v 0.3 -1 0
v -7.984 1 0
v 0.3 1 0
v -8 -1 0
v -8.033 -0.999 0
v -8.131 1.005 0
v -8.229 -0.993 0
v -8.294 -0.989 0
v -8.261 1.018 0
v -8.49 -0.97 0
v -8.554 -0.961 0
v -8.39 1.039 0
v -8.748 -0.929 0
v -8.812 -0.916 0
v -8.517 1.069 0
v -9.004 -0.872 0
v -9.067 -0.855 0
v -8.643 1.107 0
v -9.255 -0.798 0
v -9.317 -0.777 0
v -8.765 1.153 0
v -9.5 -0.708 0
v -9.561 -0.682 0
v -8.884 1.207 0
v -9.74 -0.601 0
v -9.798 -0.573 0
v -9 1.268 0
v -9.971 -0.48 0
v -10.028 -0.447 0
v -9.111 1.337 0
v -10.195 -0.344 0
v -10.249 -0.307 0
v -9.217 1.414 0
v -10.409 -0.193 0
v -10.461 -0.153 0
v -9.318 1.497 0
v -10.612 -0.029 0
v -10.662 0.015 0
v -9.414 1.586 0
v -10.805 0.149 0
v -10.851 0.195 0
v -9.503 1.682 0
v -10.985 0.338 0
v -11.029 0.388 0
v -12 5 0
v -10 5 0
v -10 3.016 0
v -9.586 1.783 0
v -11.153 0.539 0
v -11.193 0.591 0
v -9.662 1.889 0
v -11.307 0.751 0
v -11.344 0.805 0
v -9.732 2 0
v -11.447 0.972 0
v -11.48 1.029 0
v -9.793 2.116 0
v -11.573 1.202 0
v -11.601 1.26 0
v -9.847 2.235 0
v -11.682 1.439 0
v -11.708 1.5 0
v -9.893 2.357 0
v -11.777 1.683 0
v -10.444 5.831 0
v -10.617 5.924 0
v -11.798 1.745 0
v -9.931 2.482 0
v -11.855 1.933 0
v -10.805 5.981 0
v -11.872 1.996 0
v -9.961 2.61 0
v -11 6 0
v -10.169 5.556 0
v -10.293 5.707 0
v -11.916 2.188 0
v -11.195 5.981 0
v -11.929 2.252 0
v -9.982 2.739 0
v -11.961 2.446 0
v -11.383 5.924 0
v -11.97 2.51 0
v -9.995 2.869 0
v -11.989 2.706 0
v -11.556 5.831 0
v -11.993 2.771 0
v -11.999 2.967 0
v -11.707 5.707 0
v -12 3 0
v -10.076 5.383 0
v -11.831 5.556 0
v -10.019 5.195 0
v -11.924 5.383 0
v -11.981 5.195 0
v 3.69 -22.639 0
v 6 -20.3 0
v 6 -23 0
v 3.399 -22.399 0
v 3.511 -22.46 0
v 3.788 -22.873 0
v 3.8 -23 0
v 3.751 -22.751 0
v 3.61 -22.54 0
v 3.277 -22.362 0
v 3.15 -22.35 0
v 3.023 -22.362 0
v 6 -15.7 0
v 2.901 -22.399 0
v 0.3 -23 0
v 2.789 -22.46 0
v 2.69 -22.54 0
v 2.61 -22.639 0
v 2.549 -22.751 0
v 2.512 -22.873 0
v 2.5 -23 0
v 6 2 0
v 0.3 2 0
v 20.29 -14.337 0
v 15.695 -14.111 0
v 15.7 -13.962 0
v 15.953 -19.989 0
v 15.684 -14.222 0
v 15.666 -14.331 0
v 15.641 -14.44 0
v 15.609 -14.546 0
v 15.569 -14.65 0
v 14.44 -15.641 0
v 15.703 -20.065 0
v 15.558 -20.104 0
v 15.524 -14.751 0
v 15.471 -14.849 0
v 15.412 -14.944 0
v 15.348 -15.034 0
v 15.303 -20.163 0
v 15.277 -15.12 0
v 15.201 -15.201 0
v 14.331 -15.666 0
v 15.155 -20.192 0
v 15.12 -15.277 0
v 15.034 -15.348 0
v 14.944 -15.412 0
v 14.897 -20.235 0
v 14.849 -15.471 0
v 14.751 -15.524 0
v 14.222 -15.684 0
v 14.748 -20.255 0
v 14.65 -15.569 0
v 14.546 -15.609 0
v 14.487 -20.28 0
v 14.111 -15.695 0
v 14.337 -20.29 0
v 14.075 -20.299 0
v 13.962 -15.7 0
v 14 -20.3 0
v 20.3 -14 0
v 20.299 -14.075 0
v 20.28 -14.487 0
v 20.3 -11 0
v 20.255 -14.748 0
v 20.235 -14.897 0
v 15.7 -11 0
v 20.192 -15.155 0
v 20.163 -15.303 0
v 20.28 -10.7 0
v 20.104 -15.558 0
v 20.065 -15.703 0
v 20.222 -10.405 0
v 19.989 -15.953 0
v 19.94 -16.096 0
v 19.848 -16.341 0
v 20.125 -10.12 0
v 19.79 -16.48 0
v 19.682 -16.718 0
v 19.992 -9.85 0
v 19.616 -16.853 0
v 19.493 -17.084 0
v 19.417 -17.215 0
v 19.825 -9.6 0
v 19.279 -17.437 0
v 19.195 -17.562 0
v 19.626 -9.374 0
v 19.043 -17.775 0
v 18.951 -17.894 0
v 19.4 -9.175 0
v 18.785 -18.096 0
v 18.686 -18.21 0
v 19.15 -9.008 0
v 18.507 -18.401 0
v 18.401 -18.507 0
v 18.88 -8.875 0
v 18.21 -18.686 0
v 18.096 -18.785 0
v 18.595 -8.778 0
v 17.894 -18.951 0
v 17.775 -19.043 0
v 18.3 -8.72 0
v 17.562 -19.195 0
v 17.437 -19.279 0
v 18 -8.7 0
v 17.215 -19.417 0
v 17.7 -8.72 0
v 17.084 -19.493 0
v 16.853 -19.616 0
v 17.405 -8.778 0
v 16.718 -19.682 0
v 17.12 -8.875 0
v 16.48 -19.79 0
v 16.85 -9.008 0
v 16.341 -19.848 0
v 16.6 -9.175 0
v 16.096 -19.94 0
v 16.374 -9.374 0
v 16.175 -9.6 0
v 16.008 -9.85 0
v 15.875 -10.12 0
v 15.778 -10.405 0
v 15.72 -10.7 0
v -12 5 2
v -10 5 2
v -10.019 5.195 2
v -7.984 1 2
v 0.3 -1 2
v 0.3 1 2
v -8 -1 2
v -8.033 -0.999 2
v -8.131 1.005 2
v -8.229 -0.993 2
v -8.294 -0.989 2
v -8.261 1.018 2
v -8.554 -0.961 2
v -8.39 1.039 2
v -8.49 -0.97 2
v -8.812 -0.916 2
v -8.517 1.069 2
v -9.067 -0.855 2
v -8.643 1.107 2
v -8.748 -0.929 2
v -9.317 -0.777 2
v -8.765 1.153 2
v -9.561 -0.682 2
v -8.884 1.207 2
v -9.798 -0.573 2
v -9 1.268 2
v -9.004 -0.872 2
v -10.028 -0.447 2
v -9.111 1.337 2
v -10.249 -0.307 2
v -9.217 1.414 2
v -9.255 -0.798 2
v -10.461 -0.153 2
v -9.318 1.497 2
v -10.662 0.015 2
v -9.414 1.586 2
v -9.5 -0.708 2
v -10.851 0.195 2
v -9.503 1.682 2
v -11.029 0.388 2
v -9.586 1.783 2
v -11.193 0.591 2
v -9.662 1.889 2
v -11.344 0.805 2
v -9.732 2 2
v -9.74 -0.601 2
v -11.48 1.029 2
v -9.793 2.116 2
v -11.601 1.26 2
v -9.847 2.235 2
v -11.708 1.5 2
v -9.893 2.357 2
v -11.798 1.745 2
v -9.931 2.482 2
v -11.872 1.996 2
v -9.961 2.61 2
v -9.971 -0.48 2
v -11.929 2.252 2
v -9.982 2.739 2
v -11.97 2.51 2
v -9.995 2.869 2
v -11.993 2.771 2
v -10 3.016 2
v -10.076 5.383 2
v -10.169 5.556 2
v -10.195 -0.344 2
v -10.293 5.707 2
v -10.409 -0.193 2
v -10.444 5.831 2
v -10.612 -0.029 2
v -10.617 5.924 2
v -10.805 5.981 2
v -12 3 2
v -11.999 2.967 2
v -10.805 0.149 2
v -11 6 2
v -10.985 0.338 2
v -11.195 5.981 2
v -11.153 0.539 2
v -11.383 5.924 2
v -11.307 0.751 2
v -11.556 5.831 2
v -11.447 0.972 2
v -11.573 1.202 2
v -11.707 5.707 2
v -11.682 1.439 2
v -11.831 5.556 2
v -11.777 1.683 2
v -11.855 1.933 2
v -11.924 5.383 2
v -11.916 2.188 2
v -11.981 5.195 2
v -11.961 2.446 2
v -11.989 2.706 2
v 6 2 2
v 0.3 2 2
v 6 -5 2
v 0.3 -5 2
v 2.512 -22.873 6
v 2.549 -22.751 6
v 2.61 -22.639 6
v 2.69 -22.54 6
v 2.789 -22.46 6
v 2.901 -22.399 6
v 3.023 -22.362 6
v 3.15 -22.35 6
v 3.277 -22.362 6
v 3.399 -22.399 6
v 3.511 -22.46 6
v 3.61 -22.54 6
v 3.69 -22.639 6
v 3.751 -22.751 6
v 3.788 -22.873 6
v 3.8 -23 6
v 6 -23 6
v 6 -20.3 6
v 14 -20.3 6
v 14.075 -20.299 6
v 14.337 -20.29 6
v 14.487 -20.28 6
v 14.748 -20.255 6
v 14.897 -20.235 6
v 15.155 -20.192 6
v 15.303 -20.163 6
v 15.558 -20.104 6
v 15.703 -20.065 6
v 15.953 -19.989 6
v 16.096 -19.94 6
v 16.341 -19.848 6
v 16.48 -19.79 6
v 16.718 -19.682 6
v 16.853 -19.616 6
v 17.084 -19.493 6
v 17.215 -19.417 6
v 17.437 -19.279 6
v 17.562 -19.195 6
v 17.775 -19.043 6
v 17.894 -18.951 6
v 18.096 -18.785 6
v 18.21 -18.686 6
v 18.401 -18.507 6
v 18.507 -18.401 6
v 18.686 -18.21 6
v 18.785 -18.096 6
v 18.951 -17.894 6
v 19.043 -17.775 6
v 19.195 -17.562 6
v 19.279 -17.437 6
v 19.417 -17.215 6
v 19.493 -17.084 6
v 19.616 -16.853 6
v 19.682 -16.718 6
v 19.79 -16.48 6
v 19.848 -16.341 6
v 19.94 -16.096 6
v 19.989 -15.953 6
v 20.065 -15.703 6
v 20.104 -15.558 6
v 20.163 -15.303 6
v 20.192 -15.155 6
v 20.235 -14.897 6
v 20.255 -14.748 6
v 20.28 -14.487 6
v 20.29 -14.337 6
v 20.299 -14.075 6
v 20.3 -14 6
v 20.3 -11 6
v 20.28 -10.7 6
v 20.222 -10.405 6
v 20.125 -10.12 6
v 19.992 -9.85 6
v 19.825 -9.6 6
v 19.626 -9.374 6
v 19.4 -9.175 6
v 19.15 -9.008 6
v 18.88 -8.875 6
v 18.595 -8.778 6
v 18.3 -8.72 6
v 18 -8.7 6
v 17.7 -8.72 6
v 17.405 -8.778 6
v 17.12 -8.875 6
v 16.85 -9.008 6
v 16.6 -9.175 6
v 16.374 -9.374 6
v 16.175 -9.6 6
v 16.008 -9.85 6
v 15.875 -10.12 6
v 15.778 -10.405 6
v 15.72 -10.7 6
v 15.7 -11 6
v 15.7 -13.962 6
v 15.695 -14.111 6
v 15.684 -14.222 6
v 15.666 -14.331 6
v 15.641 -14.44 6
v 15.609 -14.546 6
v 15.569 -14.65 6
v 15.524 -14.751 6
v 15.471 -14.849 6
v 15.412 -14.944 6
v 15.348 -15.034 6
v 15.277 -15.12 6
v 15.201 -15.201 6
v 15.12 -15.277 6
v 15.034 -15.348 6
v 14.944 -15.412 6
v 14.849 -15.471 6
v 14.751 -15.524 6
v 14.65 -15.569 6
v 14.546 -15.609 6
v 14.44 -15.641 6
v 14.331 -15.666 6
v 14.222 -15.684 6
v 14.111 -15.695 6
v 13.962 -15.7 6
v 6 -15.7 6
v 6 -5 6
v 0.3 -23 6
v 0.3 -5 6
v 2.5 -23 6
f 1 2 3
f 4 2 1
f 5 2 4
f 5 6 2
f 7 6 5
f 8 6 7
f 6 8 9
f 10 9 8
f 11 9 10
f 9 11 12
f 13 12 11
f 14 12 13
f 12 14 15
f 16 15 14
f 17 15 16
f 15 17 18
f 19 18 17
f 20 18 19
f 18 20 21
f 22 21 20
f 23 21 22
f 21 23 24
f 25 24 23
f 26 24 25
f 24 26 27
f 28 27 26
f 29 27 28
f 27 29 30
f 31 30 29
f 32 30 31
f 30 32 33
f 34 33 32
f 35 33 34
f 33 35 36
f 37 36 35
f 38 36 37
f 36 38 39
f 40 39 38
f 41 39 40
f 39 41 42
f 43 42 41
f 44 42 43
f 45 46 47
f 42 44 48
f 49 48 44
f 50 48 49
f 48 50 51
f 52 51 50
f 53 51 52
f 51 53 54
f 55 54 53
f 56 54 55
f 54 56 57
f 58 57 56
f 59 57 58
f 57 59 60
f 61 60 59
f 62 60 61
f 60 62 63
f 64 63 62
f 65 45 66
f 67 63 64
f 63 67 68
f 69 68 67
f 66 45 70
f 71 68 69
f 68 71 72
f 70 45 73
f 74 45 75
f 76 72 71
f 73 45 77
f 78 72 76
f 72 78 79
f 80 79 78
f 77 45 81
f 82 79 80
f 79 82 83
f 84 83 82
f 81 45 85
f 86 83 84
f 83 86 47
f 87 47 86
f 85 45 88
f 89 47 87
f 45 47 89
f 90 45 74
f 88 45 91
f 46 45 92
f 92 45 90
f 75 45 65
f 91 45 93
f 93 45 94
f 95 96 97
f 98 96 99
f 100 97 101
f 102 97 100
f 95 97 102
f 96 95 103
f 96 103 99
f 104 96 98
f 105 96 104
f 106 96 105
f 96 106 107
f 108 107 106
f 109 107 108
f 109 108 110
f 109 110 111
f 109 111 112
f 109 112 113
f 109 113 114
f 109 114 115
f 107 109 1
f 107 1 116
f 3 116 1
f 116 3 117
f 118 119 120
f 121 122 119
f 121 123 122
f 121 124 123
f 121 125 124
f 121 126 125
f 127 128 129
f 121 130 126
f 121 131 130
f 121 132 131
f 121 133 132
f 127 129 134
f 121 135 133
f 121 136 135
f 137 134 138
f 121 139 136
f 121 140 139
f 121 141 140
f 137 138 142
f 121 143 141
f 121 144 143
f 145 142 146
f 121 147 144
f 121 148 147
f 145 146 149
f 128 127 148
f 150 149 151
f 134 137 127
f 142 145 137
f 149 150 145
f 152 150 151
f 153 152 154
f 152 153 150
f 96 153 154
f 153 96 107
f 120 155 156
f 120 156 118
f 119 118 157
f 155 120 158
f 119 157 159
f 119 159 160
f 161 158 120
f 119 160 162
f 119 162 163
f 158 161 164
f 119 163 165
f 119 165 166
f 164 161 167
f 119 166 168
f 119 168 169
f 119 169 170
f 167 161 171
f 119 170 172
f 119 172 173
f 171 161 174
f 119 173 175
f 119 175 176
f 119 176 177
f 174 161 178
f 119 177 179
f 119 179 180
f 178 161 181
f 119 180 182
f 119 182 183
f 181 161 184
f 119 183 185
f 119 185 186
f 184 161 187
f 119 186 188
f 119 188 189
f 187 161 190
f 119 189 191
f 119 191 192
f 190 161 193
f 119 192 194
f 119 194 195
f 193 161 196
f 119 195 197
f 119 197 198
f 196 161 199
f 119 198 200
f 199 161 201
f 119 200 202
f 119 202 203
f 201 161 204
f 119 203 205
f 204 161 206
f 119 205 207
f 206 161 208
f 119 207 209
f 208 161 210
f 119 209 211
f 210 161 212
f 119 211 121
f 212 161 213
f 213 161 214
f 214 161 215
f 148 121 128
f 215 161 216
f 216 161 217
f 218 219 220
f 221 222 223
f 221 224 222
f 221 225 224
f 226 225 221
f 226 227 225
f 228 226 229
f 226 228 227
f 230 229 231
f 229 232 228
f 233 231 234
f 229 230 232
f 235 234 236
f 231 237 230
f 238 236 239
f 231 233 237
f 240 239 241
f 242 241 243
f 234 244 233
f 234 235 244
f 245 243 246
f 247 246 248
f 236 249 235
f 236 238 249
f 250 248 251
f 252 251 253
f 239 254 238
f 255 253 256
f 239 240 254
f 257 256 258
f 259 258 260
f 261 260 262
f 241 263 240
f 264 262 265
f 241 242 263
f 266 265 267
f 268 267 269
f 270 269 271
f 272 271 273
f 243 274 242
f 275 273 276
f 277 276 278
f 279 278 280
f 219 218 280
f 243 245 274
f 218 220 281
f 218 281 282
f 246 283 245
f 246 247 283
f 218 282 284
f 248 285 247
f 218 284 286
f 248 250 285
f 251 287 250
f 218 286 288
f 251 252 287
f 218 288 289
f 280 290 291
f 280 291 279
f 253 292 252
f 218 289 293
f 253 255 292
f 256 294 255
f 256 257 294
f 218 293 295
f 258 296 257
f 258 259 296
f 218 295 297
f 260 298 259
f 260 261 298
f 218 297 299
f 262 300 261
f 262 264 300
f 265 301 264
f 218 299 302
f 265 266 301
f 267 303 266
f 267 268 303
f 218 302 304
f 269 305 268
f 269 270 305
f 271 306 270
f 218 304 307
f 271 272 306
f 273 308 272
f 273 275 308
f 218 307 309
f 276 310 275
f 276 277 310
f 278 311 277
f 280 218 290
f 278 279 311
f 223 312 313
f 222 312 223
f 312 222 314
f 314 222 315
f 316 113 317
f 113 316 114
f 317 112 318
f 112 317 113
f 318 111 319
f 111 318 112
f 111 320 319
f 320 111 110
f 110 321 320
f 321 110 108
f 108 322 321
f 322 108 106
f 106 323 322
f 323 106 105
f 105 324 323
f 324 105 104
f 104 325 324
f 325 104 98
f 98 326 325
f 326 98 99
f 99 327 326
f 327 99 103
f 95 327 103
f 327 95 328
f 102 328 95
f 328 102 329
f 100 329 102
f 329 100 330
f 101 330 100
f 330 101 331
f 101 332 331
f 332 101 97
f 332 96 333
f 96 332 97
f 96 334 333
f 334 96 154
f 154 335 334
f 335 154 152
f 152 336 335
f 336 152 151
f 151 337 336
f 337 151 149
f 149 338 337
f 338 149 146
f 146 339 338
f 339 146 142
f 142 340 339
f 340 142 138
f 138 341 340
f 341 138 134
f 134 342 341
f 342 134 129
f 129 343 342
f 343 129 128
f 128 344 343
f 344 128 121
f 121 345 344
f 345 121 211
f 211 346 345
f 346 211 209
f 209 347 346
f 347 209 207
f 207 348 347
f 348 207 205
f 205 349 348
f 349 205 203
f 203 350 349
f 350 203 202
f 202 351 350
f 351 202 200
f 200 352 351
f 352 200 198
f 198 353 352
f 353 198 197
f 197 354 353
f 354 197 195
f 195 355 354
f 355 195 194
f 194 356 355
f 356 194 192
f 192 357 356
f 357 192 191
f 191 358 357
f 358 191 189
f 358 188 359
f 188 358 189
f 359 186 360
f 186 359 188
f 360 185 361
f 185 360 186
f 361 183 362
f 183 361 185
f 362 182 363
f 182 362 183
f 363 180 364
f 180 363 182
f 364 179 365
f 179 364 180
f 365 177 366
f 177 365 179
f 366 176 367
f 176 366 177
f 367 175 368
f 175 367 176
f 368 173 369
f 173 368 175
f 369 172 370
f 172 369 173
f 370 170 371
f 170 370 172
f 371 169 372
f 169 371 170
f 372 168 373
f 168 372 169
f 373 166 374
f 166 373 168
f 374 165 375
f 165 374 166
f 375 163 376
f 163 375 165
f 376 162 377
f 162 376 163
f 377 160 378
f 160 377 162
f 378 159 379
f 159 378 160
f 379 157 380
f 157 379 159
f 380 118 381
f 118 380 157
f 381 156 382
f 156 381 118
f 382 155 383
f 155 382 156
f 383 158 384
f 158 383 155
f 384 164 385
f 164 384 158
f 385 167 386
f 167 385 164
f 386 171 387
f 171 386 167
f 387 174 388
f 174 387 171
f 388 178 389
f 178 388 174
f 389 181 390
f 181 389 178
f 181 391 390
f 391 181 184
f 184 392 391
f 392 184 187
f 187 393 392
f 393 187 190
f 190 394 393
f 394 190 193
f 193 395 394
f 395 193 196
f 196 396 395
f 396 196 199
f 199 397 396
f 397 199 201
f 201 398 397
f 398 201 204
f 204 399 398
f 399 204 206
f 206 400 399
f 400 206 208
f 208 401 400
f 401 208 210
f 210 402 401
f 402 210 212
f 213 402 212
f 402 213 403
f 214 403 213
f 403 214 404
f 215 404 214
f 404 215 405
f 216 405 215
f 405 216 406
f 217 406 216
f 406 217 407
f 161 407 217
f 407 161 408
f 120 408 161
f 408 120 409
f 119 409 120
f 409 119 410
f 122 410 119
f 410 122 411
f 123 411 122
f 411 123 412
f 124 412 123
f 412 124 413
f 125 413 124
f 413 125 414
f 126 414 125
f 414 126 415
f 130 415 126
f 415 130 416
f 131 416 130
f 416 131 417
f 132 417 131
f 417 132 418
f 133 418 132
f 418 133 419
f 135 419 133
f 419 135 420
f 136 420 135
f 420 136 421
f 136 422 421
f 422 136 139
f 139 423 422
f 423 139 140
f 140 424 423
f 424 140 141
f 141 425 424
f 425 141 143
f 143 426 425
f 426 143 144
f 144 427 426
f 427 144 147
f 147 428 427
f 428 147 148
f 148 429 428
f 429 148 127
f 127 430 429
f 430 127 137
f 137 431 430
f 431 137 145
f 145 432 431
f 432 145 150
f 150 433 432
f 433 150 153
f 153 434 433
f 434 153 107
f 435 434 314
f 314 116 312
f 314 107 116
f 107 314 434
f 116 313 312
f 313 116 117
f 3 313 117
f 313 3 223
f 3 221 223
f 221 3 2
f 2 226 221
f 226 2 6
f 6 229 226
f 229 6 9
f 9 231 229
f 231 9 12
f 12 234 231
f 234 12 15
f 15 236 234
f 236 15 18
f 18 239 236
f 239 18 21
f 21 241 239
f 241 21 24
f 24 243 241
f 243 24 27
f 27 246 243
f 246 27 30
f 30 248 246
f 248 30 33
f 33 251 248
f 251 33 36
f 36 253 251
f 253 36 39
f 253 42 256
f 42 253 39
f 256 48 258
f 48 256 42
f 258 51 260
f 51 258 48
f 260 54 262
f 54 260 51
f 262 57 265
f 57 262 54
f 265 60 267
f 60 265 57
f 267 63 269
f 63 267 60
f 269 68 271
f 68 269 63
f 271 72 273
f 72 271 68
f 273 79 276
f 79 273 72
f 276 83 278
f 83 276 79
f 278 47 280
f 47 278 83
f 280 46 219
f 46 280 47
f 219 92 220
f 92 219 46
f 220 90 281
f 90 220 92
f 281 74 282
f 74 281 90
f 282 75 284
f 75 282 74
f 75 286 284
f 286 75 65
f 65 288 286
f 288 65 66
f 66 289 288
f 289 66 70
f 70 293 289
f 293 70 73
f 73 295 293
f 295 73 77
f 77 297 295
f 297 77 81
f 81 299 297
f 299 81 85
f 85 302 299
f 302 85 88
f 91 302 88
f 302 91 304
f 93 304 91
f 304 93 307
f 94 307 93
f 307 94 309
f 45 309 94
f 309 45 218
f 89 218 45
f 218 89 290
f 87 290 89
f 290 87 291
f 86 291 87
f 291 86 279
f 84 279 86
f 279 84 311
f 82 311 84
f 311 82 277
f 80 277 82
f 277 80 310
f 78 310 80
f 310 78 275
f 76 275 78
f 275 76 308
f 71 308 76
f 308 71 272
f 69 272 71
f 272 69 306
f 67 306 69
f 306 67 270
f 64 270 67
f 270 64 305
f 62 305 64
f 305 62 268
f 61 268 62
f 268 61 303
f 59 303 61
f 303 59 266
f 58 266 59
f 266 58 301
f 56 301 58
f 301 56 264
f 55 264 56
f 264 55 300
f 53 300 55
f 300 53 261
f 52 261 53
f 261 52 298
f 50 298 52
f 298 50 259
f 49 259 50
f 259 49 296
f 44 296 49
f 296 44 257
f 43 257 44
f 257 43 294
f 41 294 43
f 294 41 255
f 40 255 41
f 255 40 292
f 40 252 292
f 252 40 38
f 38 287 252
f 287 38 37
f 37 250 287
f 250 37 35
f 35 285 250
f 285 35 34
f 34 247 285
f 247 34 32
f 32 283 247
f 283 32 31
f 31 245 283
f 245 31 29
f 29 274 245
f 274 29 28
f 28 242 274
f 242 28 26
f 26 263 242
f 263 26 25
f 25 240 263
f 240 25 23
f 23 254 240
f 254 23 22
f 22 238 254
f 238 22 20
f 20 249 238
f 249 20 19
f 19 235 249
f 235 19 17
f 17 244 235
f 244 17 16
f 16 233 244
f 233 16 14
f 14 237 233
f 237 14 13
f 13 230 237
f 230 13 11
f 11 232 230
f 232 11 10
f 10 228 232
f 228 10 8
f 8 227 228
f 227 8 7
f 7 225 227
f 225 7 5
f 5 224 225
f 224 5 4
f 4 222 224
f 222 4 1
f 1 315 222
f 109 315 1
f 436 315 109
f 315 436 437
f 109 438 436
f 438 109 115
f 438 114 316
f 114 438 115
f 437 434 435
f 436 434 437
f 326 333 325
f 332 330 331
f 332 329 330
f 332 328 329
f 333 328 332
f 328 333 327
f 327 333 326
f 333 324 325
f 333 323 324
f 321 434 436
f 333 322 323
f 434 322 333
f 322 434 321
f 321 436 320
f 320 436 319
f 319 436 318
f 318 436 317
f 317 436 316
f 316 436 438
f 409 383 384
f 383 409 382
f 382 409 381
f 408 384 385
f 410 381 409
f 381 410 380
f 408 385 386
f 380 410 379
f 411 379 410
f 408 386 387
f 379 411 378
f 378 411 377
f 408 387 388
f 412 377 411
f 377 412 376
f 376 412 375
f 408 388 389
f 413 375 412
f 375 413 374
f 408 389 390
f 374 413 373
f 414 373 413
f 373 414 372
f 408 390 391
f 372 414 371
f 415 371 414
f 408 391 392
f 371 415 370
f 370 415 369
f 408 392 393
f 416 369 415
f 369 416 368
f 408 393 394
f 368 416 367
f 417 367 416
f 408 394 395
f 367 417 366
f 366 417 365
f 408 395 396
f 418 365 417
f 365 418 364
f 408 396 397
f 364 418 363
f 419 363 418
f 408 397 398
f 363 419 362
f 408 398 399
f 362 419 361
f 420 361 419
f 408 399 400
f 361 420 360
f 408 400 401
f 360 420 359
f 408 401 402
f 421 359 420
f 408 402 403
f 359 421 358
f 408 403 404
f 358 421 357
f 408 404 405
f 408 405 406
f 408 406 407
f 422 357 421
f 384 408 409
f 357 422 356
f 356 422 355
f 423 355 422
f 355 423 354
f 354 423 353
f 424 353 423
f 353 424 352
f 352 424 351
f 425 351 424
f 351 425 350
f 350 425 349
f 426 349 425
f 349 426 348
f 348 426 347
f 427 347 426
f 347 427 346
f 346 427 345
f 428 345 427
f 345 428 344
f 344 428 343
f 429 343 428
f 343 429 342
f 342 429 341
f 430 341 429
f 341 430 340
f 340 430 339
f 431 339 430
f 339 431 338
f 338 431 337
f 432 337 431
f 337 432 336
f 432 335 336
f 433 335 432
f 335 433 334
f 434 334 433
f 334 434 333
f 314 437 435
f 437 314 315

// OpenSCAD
// Experimental key hook. Side-down print. mm. No verified load rating.
union(){
linear_extrude(height=2.0) polygon(points=[[14.221733704344391, -15.684234696703742], [14.331413174985244, -15.666126542813972], [14.439673483531255, -15.640883779279488], [14.546051042720913, -15.60861449948906], [14.650090327514404, -15.569456885452816], [14.75134582572176, -15.52357861608567], [14.84938394575467, -15.471176149180398], [14.943784873332051, -15.412473880145273], [15.034144369189349, -15.347723181108421], [15.120075500093066, -15.277201324503821], [15.201210295748218, -15.201210295748218], [15.277201324503821, -15.120075500093066], [15.347723181108421, -15.034144369189349], [15.412473880145273, -14.943784873332051], [15.471176149180396, -14.849383945754672], [15.523578616085675, -14.751345825721748], [15.56945688545281, -14.650090327514416], [15.608614499489052, -14.546051042720931], [15.640883779279486, -14.43967348353125], [15.666126542813974, -14.33141317498523], [15.684234696703742, -14.221733704344393], [15.69513069905381, -14.11110473594039], [15.7, -13.962362979088814], [15.7, -11.0], [15.719676818840236, -10.699789757893882], [15.778370599535144, -10.404716196264202], [15.875077075224041, -10.119828105560293], [16.00814157129579, -9.85], [16.17528731733016, -9.599848713279941], [16.37365440327094, -9.37365440327094], [16.599848713279943, -9.17528731733016], [16.85, -9.008141571295791], [17.119828105560295, -8.875077075224041], [17.404716196264204, -8.778370599535144], [17.699789757893882, -8.719676818840236], [18.0, -8.7], [18.300210242106118, -8.719676818840236], [18.595283803735796, -8.778370599535144], [18.880171894439705, -8.875077075224041], [19.15, -9.008141571295791], [19.400151286720057, -9.17528731733016], [19.62634559672906, -9.37365440327094], [19.82471268266984, -9.599848713279943], [19.99185842870421, -9.85], [20.12492292477596, -10.119828105560293], [20.221629400464856, -10.404716196264202], [20.280323181159766, -10.69978975789388], [20.3, -11.0], [20.3, -14.0], [20.298768551195643, -14.075253890490078], [20.290204244150054, -14.336866407410652], [20.280360564300466, -14.487051939678583], [20.25470431684129, -14.747544191638216], [20.235059109290464, -14.896764357687747], [20.192420785408146, -15.155020876872054], [20.163058173950784, -15.30263669304359], [20.103620357494133, -15.55755158538916], [20.064666077340355, -15.702930938095339], [19.988683290164502, -15.953412618897902], [19.940304149522277, -16.09593297143147], [19.848101761587003, -16.34090883967918], [19.790504927363845, -16.47995989801048], [19.682477763449448, -16.71838092942613], [19.61590987413197, -16.853367255575797], [19.49252052313897, -17.08421249469979], [19.417266632648882, -17.214556056495848], [19.27904346672131, -17.436836988574257], [19.195425823770893, -17.561979634874355], [19.042960735725654, -17.774744418830828], [18.95133740389925, -17.894150269611252], [18.78528327265022, -18.096487813976648], [18.68604659712094, -18.209645555052873], [18.50711449195122, -18.400689419398788], [18.400689419398788, -18.50711449195122], [18.209645555052873, -18.68604659712094], [18.096487813976648, -18.78528327265022], [17.894150269611252, -18.95133740389925], [17.774744418830828, -19.042960735725654], [17.561979634874355, -19.195425823770893], [17.436836988574257, -19.27904346672131], [17.214556056495848, -19.417266632648882], [17.08421249469981, -19.492520523138964], [16.853367255575815, -19.615909874131965], [16.718380929426107, -19.682477763449462], [16.47995989801046, -19.790504927363855], [16.34090883967918, -19.848101761587003], [16.09593297143147, -19.940304149522277], [15.95341261889793, -19.988683290164495], [15.702930938095367, -20.06466607734035], [15.55755158538913, -20.103620357494144], [15.30263669304356, -20.16305817395079], [15.155020876872054, -20.192420785408146], [14.896764357687747, -20.235059109290464], [14.747544191638214, -20.25470431684129], [14.48705193967858, -20.280360564300466], [14.33686640741065, -20.290204244150054], [14.075253890490078, -20.298768551195643], [14.0, -20.3], [6.0, -20.3], [6.0, -23.0], [3.8, -23.0], [3.7875104322620996, -22.873191290689515], [3.750521696132336, -22.75125576896269], [3.6904552479966544, -22.63887934853726], [3.609619407771256, -22.540380592228743], [3.511120651462741, -22.459544752003346], [3.3987442310373086, -22.399478303867664], [3.276808709310483, -22.3624895677379], [3.15, -22.35], [3.023191290689516, -22.3624895677379], [2.901255768962691, -22.399478303867664], [2.7888793485372583, -22.459544752003346], [2.690380592228744, -22.540380592228743], [2.6095447520033455, -22.63887934853726], [2.549478303867663, -22.751255768962693], [2.5124895677379, -22.873191290689515], [2.5, -23.0], [0.3, -23.0], [0.3, -17.0], [0.3, -5.0], [0.3, -1.0], [-8.0, -1.0], [-8.032719082821778, -0.9994645874763656], [-8.228928470512207, -0.9930413571921758], [-8.294226528019989, -0.9887614963880073], [-8.489595716989715, -0.9695193107936281], [-8.554474050054743, -0.9609779162063099], [-8.748166439442972, -0.9289991732945702], [-8.812347229082754, -0.9162328204870256], [-9.003533398341933, -0.8716544581445393], [-9.066741812562027, -0.8547178145994135], [-9.254603073163949, -0.7977307242175254], [-9.316568443830722, -0.7766963152426417], [-9.500300345016505, -0.7075445242911848], [-9.560757326899658, -0.6825024224550379], [-9.739573100461394, -0.6014820495192431], [-9.798262807483004, -0.572539488946419], [-9.971396736826, -0.47999747570166984], [-10.028067850650366, -0.44727839287989557], [-10.194778549709174, -0.34361101843421515], [-10.249188395926609, -0.30725552149925084], [-10.408761983893964, -0.19290670546532096], [-10.460677571189809, -0.1530704742364416], [-10.612430729463853, -0.02852987579966848], [-10.661629747323078, 0.014616504865232471], [-10.804912645582514, 0.14881558374252224], [-10.851184416257473, 0.1950873544174816], [-10.985383495134764, 0.33837025267691745], [-11.02852987579967, 0.38756927053614754], [-11.153070474236443, 0.5393224288101925], [-11.192906705465326, 0.5912380161060419], [-11.307255521499254, 0.7508116040733966], [-11.343611018434212, 0.805221450290821], [-11.447278392879893, 0.9719321493496278], [-11.479997475701671, 1.028603263174001], [-11.57253948894642, 1.201737192516997], [-11.601482049519243, 1.2604268995386039], [-11.682502422455038, 1.4392426731003387], [-11.707544524291185, 1.4996996549834956], [-11.776696315242642, 1.6834315561692796], [-11.797730724217525, 1.745396926836051], [-11.854717814599413, 1.933258187437973], [-11.871654458144539, 1.9964666016580659], [-11.916232820487025, 2.187652770917244], [-11.92899917329457, 2.251833560557027], [-11.96097791620631, 2.4455259499452566], [-11.969519310793627, 2.510404283010285], [-11.988761496388006, 2.7057734719800104], [-11.993041357192176, 2.771071529487793], [-11.999464587476366, 2.9672809171782224], [-12.0, 3.0], [-12.0, 5.0], [-11.98078528040323, 5.195090322016129], [-11.923879532511286, 5.38268343236509], [-11.831469612302545, 5.555570233019602], [-11.707106781186548, 5.707106781186548], [-11.555570233019601, 5.831469612302545], [-11.38268343236509, 5.923879532511287], [-11.195090322016128, 5.98078528040323], [-11.0, 6.0], [-10.804909677983872, 5.98078528040323], [-10.61731656763491, 5.923879532511287], [-10.444429766980399, 5.831469612302545], [-10.292893218813452, 5.707106781186548], [-10.168530387697455, 5.555570233019602], [-10.076120467488714, 5.38268343236509], [-10.01921471959677, 5.195090322016129], [-10.0, 5.0], [-10.0, 3.016363922135322], [-9.99518329410685, 2.869228777953108], [-9.982358606385999, 2.73901753835543], [-9.961045154775364, 2.609923865725208], [-9.931334206746861, 2.482500558987572], [-9.893352989141247, 2.357293264304313], [-9.847264143363285, 2.2348381385334157], [-9.79326502892629, 2.115659553323104], [-9.73158687832838, 2.0002678496718884], [-9.662493806879407, 1.889157152570035], [-9.586281681718697, 1.782803255080591], [-9.503276854866465, 1.6816615809203268], [-9.41383476573444, 1.5861652342655663], [-9.318338419079671, 1.4967231451335345], [-9.217196744919406, 1.4137183182813007], [-9.110842847429955, 1.3375061931205852], [-8.999732150328118, 1.2684131216716212], [-8.884340446676894, 1.2067349710737088], [-8.765161861466595, 1.1527358566367194], [-8.642706735695699, 1.106647010858757], [-8.51749944101242, 1.0686657932531376], [-8.390076134274777, 1.0389548452246322], [-8.260982461644593, 1.0176413936140043], [-8.13077122204687, 1.0048167058931488], [-7.983636077864688, 1.0], [0.3, 1.0], [0.3, 2.0], [6.0, 2.0], [6.0, -5.0], [6.0, -15.7], [13.962362979088812, -15.7], [14.111104735940392, -15.69513069905381], [14.221733704344391, -15.684234696703742]]);
translate([0,0,1.9]) linear_extrude(height=4.1) polygon(points=[[14.331413174985244, -15.666126542813972], [14.439673483531255, -15.640883779279488], [14.546051042720913, -15.60861449948906], [14.650090327514404, -15.569456885452816], [14.75134582572176, -15.52357861608567], [14.84938394575467, -15.471176149180398], [14.943784873332051, -15.412473880145273], [15.034144369189349, -15.347723181108421], [15.120075500093066, -15.277201324503821], [15.201210295748218, -15.201210295748218], [15.277201324503821, -15.120075500093066], [15.347723181108421, -15.034144369189349], [15.412473880145273, -14.943784873332051], [15.471176149180396, -14.849383945754672], [15.523578616085675, -14.751345825721748], [15.56945688545281, -14.650090327514416], [15.608614499489052, -14.546051042720931], [15.640883779279486, -14.43967348353125], [15.666126542813974, -14.33141317498523], [15.684234696703742, -14.221733704344393], [15.69513069905381, -14.11110473594039], [15.7, -13.962362979088814], [15.7, -11.0], [15.719676818840236, -10.699789757893882], [15.778370599535144, -10.404716196264202], [15.875077075224041, -10.119828105560293], [16.00814157129579, -9.85], [16.17528731733016, -9.599848713279941], [16.37365440327094, -9.37365440327094], [16.599848713279943, -9.17528731733016], [16.85, -9.008141571295791], [17.119828105560295, -8.875077075224041], [17.404716196264204, -8.778370599535144], [17.699789757893882, -8.719676818840236], [18.0, -8.7], [18.300210242106118, -8.719676818840236], [18.595283803735796, -8.778370599535144], [18.880171894439705, -8.875077075224041], [19.15, -9.008141571295791], [19.400151286720057, -9.17528731733016], [19.62634559672906, -9.37365440327094], [19.82471268266984, -9.599848713279943], [19.99185842870421, -9.85], [20.12492292477596, -10.119828105560293], [20.221629400464856, -10.404716196264202], [20.280323181159766, -10.69978975789388], [20.3, -11.0], [20.3, -14.0], [20.298768551195643, -14.075253890490078], [20.290204244150054, -14.336866407410652], [20.280360564300466, -14.487051939678583], [20.25470431684129, -14.747544191638216], [20.235059109290464, -14.896764357687747], [20.192420785408146, -15.155020876872054], [20.163058173950784, -15.30263669304359], [20.103620357494133, -15.55755158538916], [20.064666077340355, -15.702930938095339], [19.988683290164502, -15.953412618897902], [19.940304149522277, -16.09593297143147], [19.848101761587003, -16.34090883967918], [19.790504927363845, -16.47995989801048], [19.682477763449448, -16.71838092942613], [19.61590987413197, -16.853367255575797], [19.49252052313897, -17.08421249469979], [19.417266632648882, -17.214556056495848], [19.27904346672131, -17.436836988574257], [19.195425823770893, -17.561979634874355], [19.042960735725654, -17.774744418830828], [18.95133740389925, -17.894150269611252], [18.78528327265022, -18.096487813976648], [18.68604659712094, -18.209645555052873], [18.50711449195122, -18.400689419398788], [18.400689419398788, -18.50711449195122], [18.209645555052873, -18.68604659712094], [18.096487813976648, -18.78528327265022], [17.894150269611252, -18.95133740389925], [17.774744418830828, -19.042960735725654], [17.561979634874355, -19.195425823770893], [17.436836988574257, -19.27904346672131], [17.214556056495848, -19.417266632648882], [17.08421249469981, -19.492520523138964], [16.853367255575815, -19.615909874131965], [16.718380929426107, -19.682477763449462], [16.47995989801046, -19.790504927363855], [16.34090883967918, -19.848101761587003], [16.09593297143147, -19.940304149522277], [15.95341261889793, -19.988683290164495], [15.702930938095367, -20.06466607734035], [15.55755158538913, -20.103620357494144], [15.30263669304356, -20.16305817395079], [15.155020876872054, -20.192420785408146], [14.896764357687747, -20.235059109290464], [14.747544191638214, -20.25470431684129], [14.48705193967858, -20.280360564300466], [14.33686640741065, -20.290204244150054], [14.075253890490078, -20.298768551195643], [14.0, -20.3], [6.0, -20.3], [6.0, -23.0], [3.8, -23.0], [3.7875104322620996, -22.873191290689515], [3.750521696132336, -22.75125576896269], [3.6904552479966544, -22.63887934853726], [3.609619407771256, -22.540380592228743], [3.511120651462741, -22.459544752003346], [3.3987442310373086, -22.399478303867664], [3.276808709310483, -22.3624895677379], [3.15, -22.35], [3.023191290689516, -22.3624895677379], [2.901255768962691, -22.399478303867664], [2.7888793485372583, -22.459544752003346], [2.690380592228744, -22.540380592228743], [2.6095447520033455, -22.63887934853726], [2.549478303867663, -22.751255768962693], [2.5124895677379, -22.873191290689515], [2.5, -23.0], [0.3, -23.0], [0.3, -17.0], [0.3, -5.0], [6.0, -5.0], [6.0, -15.7], [13.962362979088812, -15.7], [14.111104735940392, -15.69513069905381], [14.221733704344391, -15.684234696703742], [14.331413174985244, -15.666126542813972]]);
}
